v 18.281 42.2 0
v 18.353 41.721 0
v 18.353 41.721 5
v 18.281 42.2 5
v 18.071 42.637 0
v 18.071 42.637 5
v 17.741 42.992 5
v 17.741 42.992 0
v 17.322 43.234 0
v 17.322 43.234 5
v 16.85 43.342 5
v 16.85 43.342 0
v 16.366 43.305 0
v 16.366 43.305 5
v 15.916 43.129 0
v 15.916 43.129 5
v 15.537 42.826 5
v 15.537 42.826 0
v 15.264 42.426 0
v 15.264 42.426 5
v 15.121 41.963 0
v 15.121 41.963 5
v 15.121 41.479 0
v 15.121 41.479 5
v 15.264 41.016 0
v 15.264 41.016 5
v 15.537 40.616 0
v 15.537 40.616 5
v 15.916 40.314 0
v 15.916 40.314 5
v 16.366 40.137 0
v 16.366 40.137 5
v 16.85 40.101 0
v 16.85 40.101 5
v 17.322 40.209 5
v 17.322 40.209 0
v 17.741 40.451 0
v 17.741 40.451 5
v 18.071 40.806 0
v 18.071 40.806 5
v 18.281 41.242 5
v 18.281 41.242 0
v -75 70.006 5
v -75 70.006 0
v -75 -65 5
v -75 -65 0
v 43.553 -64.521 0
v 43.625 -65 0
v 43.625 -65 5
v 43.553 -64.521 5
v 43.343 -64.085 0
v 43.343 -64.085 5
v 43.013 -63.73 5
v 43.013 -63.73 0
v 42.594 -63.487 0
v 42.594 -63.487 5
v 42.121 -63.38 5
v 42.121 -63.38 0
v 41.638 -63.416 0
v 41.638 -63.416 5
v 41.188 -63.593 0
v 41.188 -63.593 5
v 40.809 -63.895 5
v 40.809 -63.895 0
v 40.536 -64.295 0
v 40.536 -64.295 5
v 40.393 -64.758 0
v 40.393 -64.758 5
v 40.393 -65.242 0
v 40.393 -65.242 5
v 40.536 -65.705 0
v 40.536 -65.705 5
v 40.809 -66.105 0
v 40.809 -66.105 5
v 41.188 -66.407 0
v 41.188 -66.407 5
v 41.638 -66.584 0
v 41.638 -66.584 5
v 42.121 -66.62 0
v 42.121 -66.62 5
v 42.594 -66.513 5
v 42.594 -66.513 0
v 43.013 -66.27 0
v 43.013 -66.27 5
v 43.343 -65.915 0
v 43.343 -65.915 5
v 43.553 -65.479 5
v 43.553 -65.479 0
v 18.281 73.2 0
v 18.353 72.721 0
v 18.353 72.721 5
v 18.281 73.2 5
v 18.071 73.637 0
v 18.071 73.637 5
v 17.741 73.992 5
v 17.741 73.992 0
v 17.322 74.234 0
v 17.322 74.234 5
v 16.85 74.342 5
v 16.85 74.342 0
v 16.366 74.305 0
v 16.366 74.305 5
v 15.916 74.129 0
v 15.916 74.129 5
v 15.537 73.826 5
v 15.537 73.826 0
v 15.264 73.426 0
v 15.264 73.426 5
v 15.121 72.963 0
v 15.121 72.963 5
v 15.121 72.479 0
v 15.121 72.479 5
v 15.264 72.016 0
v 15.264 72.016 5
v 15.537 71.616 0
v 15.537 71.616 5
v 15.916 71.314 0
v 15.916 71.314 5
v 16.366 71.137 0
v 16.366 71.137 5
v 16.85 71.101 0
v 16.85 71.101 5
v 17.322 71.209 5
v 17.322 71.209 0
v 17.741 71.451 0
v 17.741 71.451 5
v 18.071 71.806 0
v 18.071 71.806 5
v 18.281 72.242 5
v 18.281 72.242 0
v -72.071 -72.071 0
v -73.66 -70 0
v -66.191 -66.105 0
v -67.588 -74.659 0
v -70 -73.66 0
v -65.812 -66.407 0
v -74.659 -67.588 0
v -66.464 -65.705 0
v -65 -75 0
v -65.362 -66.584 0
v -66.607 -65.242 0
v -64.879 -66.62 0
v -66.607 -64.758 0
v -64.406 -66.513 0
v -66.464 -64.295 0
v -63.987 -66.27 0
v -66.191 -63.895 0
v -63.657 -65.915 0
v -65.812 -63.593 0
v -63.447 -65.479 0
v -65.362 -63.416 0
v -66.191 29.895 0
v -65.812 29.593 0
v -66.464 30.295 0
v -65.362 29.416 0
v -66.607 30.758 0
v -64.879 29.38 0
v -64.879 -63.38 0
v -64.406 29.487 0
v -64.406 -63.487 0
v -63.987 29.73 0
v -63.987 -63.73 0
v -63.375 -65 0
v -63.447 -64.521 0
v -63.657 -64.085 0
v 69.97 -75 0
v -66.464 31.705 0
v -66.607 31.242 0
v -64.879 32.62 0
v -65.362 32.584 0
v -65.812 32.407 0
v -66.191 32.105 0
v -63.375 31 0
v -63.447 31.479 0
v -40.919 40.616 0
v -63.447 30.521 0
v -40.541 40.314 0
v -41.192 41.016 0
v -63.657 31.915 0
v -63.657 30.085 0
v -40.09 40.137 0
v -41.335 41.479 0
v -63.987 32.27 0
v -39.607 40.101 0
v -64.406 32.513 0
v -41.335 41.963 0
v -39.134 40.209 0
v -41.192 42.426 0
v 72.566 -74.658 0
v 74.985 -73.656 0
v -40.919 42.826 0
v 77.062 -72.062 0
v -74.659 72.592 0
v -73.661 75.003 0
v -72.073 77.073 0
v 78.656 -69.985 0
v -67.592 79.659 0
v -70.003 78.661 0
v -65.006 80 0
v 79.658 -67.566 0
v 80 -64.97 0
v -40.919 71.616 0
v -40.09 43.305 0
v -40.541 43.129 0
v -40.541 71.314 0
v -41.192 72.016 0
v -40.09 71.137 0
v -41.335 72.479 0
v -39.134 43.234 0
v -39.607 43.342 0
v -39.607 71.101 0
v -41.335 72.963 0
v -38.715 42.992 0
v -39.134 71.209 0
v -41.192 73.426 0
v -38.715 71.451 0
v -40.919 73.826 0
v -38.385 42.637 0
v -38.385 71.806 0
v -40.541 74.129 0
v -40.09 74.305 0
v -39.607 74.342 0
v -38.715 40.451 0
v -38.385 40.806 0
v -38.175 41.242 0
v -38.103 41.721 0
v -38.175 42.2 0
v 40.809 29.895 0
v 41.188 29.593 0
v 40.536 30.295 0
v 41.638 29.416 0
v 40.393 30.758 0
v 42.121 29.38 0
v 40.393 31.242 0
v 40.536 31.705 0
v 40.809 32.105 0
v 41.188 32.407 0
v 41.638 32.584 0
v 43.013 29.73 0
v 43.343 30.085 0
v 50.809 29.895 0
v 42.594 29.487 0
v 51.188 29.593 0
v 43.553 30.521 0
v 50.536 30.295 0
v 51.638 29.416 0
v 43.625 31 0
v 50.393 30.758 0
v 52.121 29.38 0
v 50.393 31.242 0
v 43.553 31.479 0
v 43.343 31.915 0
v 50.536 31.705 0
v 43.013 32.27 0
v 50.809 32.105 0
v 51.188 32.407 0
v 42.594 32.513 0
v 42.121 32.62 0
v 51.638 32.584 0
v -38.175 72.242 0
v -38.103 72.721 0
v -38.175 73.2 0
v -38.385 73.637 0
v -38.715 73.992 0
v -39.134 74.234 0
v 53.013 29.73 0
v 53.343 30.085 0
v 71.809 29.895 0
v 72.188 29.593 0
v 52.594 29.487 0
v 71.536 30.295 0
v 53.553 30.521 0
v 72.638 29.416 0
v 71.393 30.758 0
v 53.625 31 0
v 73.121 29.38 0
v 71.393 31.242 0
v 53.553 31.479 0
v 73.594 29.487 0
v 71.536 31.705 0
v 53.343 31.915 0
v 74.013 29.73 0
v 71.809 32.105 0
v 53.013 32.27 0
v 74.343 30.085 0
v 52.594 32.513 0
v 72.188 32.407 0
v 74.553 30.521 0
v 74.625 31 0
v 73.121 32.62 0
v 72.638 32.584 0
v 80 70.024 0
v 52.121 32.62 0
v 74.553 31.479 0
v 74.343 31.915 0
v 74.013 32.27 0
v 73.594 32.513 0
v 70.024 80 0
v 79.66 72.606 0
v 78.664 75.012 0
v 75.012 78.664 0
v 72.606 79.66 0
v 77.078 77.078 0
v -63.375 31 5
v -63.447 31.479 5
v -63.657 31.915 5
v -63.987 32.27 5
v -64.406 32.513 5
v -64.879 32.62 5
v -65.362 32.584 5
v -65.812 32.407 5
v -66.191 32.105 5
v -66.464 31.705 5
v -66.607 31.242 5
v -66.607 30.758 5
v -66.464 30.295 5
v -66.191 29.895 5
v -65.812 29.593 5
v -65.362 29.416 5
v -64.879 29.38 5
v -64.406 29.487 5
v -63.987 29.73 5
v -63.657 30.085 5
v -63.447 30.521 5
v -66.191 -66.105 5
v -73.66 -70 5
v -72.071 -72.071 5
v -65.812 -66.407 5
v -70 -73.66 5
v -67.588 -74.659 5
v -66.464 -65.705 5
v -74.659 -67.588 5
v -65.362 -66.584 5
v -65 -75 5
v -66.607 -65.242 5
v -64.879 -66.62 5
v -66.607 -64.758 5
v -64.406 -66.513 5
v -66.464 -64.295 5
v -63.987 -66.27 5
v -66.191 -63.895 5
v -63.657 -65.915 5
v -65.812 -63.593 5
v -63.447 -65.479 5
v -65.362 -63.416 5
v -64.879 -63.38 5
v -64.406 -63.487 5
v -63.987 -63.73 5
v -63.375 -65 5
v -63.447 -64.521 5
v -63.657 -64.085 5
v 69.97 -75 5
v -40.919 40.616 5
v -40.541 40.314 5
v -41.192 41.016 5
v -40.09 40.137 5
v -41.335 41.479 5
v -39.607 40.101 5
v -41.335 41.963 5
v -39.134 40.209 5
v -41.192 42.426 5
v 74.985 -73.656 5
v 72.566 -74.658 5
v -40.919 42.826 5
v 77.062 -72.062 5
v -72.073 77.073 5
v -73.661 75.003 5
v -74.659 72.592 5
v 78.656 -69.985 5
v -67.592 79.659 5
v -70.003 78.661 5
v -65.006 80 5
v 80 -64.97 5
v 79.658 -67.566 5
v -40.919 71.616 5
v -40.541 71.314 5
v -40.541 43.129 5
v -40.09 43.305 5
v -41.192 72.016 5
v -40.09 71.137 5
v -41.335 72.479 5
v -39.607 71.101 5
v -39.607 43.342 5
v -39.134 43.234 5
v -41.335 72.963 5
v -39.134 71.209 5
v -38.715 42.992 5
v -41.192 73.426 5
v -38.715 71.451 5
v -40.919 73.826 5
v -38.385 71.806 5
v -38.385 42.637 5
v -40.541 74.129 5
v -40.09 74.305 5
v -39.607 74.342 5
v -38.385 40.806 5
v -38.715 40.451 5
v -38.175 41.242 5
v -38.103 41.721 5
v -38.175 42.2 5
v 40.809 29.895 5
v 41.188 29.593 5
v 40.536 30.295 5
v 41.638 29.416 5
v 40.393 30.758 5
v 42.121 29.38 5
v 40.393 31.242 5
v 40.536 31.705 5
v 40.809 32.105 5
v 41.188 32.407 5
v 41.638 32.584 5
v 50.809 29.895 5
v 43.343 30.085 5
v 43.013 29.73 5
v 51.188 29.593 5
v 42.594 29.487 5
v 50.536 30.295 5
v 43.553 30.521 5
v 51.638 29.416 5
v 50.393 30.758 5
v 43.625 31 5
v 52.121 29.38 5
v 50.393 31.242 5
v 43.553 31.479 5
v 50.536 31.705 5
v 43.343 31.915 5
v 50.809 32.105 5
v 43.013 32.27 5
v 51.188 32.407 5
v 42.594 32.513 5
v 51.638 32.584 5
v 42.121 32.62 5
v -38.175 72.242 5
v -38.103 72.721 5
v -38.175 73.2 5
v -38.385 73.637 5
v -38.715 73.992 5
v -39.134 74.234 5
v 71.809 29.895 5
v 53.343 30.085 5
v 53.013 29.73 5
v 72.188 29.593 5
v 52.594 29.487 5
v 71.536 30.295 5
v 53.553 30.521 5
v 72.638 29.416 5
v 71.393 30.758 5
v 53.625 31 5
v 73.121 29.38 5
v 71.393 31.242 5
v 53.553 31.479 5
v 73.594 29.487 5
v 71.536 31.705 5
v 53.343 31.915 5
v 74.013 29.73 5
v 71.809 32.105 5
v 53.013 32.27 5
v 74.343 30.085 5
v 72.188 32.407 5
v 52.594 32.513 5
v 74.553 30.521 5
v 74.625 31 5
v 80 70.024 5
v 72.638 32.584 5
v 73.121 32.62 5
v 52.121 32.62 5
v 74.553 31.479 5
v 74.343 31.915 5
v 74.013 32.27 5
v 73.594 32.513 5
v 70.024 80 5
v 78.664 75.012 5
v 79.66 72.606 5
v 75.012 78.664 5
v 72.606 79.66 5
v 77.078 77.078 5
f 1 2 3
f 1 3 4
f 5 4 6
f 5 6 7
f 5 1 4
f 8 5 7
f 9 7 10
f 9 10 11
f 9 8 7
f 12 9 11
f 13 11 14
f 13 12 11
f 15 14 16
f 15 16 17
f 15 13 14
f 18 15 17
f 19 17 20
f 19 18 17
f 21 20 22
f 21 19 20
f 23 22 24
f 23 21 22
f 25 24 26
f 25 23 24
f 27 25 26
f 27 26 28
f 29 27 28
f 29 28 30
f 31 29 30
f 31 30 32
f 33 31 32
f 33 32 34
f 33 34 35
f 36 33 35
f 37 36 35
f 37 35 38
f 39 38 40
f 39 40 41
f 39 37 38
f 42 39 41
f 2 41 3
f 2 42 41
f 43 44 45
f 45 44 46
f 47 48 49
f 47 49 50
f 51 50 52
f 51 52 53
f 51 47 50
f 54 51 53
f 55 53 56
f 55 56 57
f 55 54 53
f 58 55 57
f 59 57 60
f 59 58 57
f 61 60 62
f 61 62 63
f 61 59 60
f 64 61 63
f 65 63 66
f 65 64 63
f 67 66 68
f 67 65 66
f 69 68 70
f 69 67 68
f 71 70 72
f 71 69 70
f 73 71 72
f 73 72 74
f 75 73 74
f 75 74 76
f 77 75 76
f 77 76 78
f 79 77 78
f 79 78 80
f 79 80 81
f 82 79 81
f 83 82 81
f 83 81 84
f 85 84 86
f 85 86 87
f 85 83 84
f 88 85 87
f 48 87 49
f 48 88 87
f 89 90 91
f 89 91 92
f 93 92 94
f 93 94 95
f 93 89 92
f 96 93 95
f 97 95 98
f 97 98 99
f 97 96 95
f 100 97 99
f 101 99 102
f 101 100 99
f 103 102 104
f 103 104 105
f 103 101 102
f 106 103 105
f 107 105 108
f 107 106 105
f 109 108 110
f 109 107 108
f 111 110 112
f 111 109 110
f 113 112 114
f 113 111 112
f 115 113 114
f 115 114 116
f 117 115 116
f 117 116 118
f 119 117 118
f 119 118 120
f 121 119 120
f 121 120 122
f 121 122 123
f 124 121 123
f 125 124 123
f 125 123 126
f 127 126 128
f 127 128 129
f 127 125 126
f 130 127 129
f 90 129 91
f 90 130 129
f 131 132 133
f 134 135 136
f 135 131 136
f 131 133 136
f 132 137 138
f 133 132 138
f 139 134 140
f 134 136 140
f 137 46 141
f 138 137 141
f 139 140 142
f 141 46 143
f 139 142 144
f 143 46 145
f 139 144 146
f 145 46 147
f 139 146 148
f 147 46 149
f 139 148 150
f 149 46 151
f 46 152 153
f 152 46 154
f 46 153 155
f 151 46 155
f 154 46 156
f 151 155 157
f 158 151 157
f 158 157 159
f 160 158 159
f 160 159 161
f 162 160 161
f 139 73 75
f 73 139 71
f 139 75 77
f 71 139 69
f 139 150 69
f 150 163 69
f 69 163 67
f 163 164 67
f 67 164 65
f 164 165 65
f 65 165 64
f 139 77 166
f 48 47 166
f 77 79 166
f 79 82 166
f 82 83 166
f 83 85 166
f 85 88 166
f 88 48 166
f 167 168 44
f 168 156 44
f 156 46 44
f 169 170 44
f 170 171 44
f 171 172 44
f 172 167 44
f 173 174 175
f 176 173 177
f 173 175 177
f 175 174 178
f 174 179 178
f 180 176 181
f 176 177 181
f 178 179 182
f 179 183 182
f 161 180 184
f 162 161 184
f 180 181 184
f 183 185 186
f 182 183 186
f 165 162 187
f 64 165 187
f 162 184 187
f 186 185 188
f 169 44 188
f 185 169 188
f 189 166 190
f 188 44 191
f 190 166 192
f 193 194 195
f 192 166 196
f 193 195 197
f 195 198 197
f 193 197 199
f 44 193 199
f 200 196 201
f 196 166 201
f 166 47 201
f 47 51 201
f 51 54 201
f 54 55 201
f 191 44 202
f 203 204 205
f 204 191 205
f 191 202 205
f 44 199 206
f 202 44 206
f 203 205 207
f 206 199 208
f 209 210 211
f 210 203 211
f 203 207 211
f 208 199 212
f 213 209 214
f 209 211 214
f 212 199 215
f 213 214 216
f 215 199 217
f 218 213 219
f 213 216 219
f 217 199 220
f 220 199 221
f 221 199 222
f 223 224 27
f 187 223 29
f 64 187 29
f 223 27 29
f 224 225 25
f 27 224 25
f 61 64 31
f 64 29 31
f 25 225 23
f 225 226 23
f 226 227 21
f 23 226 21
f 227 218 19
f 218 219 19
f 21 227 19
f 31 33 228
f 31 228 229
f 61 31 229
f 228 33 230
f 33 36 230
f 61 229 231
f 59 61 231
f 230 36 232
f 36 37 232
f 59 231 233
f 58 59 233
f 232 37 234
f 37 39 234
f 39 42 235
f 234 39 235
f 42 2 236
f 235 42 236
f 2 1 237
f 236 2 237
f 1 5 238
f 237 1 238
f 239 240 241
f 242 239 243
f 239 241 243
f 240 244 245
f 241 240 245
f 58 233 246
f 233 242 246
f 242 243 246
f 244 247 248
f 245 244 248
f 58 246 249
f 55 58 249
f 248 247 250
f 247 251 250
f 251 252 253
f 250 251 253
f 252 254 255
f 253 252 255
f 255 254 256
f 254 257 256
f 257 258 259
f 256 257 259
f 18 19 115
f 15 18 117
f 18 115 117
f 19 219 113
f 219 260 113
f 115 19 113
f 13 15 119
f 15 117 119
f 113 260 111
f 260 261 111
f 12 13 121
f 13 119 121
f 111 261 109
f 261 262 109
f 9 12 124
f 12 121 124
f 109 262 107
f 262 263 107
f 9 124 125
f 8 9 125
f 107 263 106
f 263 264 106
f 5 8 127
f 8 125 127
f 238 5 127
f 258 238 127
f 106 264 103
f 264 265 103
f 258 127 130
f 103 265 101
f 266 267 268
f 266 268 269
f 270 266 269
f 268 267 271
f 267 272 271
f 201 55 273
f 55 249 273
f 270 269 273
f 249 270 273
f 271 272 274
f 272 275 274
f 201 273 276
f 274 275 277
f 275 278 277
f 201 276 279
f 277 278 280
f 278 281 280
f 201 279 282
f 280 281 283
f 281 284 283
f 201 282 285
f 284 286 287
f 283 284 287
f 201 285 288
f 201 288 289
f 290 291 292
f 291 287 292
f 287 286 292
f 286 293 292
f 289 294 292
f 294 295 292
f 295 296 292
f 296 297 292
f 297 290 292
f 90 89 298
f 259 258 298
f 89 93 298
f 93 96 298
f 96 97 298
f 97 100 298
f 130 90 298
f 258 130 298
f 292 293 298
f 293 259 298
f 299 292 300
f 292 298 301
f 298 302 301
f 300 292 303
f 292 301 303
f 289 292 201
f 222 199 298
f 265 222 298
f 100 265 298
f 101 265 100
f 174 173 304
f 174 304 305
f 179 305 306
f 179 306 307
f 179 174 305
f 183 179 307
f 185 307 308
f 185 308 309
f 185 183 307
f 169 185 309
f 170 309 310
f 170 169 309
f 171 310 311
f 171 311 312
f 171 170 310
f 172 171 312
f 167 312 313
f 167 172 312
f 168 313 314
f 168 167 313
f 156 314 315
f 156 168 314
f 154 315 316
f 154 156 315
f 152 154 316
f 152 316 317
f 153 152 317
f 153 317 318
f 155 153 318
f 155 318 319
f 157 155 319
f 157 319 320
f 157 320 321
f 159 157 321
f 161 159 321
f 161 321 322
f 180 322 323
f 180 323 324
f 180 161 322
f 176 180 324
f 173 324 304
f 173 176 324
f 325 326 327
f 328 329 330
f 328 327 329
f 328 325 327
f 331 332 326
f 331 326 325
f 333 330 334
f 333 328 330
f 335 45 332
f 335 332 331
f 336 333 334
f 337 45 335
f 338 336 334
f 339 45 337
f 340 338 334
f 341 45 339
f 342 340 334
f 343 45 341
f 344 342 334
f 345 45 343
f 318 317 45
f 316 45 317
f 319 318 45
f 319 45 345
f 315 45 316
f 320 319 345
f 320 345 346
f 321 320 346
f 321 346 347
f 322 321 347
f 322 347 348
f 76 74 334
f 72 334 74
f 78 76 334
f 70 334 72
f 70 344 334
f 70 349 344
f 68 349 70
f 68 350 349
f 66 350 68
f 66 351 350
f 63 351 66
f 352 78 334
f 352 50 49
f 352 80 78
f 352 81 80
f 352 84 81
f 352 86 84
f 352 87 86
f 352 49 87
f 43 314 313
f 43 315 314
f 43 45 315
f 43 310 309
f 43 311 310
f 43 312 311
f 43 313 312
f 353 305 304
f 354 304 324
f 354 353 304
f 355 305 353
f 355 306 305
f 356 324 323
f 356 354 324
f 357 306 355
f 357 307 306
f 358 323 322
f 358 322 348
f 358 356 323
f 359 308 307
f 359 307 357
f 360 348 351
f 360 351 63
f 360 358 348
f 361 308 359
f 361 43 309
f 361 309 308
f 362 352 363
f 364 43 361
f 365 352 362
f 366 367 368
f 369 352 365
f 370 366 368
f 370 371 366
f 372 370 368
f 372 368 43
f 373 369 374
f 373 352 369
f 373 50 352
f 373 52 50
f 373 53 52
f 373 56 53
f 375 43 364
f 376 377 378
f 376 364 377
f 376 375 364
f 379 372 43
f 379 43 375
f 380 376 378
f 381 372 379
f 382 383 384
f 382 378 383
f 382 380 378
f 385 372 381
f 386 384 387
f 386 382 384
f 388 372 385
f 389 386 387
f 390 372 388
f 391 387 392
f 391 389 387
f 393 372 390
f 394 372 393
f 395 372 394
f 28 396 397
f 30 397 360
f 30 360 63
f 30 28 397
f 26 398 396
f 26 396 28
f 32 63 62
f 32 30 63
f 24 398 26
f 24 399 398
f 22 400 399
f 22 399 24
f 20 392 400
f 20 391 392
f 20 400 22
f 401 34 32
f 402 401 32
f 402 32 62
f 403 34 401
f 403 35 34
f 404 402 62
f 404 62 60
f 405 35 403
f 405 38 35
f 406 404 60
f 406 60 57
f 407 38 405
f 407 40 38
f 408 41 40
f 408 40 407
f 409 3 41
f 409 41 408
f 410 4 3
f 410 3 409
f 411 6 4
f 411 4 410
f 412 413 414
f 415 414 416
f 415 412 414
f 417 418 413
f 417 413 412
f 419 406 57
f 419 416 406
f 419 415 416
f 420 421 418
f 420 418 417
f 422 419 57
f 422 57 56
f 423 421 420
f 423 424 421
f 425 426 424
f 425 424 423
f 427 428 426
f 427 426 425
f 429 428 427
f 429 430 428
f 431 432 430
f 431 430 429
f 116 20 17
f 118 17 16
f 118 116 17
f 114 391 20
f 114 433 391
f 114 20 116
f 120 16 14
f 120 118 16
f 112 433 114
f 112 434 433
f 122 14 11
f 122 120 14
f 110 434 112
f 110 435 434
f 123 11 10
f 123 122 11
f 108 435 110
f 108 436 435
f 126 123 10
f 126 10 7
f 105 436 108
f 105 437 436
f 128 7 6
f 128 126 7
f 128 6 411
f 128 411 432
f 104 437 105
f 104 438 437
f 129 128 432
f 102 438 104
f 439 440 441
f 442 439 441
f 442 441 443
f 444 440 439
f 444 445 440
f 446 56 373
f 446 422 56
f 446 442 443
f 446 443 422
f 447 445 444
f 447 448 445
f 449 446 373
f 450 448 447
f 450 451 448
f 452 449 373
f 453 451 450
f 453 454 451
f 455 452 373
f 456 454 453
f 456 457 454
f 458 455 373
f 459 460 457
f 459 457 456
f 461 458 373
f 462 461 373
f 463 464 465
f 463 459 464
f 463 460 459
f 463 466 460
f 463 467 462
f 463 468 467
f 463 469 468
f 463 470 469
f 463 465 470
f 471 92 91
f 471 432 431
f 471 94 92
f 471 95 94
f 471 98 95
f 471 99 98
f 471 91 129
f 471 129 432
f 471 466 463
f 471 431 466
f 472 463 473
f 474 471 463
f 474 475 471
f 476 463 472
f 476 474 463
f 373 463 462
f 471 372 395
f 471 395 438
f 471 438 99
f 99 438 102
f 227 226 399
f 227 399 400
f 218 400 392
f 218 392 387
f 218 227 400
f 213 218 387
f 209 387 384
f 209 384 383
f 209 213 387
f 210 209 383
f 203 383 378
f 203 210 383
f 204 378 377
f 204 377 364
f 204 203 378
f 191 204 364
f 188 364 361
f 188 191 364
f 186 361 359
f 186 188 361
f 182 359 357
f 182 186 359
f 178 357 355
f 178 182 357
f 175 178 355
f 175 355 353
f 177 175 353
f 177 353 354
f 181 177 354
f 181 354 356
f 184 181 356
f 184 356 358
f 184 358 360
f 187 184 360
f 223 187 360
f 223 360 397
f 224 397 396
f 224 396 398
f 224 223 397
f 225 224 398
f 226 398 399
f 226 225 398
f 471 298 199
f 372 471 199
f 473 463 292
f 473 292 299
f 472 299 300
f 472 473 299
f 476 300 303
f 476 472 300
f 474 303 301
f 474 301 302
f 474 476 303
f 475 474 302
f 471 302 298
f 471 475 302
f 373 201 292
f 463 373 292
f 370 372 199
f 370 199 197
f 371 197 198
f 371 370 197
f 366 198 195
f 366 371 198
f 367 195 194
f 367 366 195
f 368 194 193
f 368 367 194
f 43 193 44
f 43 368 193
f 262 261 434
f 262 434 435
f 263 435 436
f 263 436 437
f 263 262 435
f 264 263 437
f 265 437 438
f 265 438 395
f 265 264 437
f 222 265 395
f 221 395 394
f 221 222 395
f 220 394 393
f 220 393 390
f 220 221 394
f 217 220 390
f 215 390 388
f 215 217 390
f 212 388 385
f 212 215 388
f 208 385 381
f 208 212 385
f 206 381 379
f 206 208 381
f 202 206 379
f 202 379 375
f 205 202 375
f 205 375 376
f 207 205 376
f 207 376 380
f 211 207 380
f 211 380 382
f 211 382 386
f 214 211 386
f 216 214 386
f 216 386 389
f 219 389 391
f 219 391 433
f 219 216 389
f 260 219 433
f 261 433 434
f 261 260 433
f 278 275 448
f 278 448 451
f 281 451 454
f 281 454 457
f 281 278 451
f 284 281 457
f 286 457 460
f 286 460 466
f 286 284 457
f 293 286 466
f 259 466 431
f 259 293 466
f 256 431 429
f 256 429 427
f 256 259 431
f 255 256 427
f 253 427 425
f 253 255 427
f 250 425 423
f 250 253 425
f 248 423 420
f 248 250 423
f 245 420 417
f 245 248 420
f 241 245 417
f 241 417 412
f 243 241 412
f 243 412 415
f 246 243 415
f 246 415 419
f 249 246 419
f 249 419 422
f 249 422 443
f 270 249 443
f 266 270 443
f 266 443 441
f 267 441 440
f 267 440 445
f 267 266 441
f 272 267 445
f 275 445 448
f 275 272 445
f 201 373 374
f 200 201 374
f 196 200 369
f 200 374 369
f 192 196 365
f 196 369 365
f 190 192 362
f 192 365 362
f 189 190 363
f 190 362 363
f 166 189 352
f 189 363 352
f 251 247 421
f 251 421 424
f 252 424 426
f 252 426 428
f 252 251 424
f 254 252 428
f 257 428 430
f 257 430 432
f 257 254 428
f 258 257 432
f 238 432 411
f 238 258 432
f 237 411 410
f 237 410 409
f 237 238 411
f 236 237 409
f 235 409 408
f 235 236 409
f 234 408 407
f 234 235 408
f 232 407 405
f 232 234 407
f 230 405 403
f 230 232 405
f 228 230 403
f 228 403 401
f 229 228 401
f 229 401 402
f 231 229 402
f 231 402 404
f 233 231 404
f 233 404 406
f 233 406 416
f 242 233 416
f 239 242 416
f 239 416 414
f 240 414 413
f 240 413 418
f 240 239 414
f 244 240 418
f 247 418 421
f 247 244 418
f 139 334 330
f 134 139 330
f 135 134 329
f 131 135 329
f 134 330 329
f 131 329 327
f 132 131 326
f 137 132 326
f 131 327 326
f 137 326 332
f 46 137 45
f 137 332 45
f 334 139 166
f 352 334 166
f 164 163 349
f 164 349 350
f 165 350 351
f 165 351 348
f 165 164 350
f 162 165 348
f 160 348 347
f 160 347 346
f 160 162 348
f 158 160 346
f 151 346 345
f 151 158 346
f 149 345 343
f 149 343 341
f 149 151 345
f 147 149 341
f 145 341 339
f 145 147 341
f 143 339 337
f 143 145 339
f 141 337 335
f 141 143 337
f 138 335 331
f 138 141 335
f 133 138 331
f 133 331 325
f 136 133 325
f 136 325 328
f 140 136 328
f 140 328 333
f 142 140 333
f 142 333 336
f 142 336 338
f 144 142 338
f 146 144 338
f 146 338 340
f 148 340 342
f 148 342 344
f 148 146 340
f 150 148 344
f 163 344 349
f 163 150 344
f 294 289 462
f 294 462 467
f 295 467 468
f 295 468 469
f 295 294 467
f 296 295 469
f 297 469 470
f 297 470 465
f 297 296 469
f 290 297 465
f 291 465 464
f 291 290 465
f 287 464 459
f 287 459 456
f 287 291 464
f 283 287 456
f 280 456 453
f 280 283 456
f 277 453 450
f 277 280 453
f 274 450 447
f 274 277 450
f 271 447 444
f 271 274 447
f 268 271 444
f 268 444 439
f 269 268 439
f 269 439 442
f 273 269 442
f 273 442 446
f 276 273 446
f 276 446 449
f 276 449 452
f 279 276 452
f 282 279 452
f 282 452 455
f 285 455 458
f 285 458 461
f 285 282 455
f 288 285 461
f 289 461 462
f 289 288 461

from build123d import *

# Parameters (mm, degrees)
SKETCH1_R           = 1.625
BOSS_EXTRUDE1_DEPTH = 5
CUT_EXTRUDE1_DEPTH  = 5


with BuildPart() as part:
    # Sketch1 → Boss-Extrude1 (new body)
    with BuildSketch(Plane.XY):
        Polygon((-75, 75), (-75, -75), (75, -75), (80, -75), (80, 80), (75, 80), (-75, 80), align=None)
        with Locations((-65, -65)):
            Circle(SKETCH1_R, mode=Mode.SUBTRACT)
        with Locations((-65, 31)):
            Circle(SKETCH1_R, mode=Mode.SUBTRACT)
        with Locations((42, 31)):
            Circle(SKETCH1_R, mode=Mode.SUBTRACT)
        with Locations((42, -65)):
            Circle(SKETCH1_R, mode=Mode.SUBTRACT)
        with Locations((52, 31)):
            Circle(SKETCH1_R, mode=Mode.SUBTRACT)
        with Locations((73, 31)):
            Circle(SKETCH1_R, mode=Mode.SUBTRACT)
        with Locations((-39.728067716, 72.721211314)):
            Circle(SKETCH1_R, mode=Mode.SUBTRACT)
        with Locations((-39.728067716, 41.721211314)):
            Circle(SKETCH1_R, mode=Mode.SUBTRACT)
        with Locations((16.728067716, 41.721211314)):
            Circle(SKETCH1_R, mode=Mode.SUBTRACT)
        with Locations((16.728067716, 72.721211314)):
            Circle(SKETCH1_R, mode=Mode.SUBTRACT)
    extrude(amount=BOSS_EXTRUDE1_DEPTH)

    # Sketch2 → Cut-Extrude1 (cut)
    with BuildSketch(Plane.XY.offset(5)):
        with BuildLine():
            Line((-75, 70.005557821), (-75, 80))
            Line((-75, 80), (-65.005557821, 80))
            ThreePointArc((-65.005557821, 80), (-72.07269566, 77.07269566), (-75, 70.005557821))
        make_face()
        with BuildLine():
            Line((70.02446388, 80), (80, 80))
            Line((80, 80), (80, 70.02446388))
            ThreePointArc((80, 70.02446388), (77.078233116, 77.078233116), (70.02446388, 80))
        make_face()
        with BuildLine():
            Line((69.9697939, -75), (80, -75))
            Line((80, -75), (80, -64.9697939))
            ThreePointArc((80, -64.9697939), (77.06222065, -72.06222065), (69.9697939, -75))
        make_face()
        with BuildLine():
            Line((-75, -65), (-75, -75))
            Line((-75, -75), (-65, -75))
            ThreePointArc((-65, -75), (-72.071067812, -72.071067812), (-75, -65))
        make_face()
    extrude(amount=-CUT_EXTRUDE1_DEPTH, mode=Mode.SUBTRACT)


solid = part.part
